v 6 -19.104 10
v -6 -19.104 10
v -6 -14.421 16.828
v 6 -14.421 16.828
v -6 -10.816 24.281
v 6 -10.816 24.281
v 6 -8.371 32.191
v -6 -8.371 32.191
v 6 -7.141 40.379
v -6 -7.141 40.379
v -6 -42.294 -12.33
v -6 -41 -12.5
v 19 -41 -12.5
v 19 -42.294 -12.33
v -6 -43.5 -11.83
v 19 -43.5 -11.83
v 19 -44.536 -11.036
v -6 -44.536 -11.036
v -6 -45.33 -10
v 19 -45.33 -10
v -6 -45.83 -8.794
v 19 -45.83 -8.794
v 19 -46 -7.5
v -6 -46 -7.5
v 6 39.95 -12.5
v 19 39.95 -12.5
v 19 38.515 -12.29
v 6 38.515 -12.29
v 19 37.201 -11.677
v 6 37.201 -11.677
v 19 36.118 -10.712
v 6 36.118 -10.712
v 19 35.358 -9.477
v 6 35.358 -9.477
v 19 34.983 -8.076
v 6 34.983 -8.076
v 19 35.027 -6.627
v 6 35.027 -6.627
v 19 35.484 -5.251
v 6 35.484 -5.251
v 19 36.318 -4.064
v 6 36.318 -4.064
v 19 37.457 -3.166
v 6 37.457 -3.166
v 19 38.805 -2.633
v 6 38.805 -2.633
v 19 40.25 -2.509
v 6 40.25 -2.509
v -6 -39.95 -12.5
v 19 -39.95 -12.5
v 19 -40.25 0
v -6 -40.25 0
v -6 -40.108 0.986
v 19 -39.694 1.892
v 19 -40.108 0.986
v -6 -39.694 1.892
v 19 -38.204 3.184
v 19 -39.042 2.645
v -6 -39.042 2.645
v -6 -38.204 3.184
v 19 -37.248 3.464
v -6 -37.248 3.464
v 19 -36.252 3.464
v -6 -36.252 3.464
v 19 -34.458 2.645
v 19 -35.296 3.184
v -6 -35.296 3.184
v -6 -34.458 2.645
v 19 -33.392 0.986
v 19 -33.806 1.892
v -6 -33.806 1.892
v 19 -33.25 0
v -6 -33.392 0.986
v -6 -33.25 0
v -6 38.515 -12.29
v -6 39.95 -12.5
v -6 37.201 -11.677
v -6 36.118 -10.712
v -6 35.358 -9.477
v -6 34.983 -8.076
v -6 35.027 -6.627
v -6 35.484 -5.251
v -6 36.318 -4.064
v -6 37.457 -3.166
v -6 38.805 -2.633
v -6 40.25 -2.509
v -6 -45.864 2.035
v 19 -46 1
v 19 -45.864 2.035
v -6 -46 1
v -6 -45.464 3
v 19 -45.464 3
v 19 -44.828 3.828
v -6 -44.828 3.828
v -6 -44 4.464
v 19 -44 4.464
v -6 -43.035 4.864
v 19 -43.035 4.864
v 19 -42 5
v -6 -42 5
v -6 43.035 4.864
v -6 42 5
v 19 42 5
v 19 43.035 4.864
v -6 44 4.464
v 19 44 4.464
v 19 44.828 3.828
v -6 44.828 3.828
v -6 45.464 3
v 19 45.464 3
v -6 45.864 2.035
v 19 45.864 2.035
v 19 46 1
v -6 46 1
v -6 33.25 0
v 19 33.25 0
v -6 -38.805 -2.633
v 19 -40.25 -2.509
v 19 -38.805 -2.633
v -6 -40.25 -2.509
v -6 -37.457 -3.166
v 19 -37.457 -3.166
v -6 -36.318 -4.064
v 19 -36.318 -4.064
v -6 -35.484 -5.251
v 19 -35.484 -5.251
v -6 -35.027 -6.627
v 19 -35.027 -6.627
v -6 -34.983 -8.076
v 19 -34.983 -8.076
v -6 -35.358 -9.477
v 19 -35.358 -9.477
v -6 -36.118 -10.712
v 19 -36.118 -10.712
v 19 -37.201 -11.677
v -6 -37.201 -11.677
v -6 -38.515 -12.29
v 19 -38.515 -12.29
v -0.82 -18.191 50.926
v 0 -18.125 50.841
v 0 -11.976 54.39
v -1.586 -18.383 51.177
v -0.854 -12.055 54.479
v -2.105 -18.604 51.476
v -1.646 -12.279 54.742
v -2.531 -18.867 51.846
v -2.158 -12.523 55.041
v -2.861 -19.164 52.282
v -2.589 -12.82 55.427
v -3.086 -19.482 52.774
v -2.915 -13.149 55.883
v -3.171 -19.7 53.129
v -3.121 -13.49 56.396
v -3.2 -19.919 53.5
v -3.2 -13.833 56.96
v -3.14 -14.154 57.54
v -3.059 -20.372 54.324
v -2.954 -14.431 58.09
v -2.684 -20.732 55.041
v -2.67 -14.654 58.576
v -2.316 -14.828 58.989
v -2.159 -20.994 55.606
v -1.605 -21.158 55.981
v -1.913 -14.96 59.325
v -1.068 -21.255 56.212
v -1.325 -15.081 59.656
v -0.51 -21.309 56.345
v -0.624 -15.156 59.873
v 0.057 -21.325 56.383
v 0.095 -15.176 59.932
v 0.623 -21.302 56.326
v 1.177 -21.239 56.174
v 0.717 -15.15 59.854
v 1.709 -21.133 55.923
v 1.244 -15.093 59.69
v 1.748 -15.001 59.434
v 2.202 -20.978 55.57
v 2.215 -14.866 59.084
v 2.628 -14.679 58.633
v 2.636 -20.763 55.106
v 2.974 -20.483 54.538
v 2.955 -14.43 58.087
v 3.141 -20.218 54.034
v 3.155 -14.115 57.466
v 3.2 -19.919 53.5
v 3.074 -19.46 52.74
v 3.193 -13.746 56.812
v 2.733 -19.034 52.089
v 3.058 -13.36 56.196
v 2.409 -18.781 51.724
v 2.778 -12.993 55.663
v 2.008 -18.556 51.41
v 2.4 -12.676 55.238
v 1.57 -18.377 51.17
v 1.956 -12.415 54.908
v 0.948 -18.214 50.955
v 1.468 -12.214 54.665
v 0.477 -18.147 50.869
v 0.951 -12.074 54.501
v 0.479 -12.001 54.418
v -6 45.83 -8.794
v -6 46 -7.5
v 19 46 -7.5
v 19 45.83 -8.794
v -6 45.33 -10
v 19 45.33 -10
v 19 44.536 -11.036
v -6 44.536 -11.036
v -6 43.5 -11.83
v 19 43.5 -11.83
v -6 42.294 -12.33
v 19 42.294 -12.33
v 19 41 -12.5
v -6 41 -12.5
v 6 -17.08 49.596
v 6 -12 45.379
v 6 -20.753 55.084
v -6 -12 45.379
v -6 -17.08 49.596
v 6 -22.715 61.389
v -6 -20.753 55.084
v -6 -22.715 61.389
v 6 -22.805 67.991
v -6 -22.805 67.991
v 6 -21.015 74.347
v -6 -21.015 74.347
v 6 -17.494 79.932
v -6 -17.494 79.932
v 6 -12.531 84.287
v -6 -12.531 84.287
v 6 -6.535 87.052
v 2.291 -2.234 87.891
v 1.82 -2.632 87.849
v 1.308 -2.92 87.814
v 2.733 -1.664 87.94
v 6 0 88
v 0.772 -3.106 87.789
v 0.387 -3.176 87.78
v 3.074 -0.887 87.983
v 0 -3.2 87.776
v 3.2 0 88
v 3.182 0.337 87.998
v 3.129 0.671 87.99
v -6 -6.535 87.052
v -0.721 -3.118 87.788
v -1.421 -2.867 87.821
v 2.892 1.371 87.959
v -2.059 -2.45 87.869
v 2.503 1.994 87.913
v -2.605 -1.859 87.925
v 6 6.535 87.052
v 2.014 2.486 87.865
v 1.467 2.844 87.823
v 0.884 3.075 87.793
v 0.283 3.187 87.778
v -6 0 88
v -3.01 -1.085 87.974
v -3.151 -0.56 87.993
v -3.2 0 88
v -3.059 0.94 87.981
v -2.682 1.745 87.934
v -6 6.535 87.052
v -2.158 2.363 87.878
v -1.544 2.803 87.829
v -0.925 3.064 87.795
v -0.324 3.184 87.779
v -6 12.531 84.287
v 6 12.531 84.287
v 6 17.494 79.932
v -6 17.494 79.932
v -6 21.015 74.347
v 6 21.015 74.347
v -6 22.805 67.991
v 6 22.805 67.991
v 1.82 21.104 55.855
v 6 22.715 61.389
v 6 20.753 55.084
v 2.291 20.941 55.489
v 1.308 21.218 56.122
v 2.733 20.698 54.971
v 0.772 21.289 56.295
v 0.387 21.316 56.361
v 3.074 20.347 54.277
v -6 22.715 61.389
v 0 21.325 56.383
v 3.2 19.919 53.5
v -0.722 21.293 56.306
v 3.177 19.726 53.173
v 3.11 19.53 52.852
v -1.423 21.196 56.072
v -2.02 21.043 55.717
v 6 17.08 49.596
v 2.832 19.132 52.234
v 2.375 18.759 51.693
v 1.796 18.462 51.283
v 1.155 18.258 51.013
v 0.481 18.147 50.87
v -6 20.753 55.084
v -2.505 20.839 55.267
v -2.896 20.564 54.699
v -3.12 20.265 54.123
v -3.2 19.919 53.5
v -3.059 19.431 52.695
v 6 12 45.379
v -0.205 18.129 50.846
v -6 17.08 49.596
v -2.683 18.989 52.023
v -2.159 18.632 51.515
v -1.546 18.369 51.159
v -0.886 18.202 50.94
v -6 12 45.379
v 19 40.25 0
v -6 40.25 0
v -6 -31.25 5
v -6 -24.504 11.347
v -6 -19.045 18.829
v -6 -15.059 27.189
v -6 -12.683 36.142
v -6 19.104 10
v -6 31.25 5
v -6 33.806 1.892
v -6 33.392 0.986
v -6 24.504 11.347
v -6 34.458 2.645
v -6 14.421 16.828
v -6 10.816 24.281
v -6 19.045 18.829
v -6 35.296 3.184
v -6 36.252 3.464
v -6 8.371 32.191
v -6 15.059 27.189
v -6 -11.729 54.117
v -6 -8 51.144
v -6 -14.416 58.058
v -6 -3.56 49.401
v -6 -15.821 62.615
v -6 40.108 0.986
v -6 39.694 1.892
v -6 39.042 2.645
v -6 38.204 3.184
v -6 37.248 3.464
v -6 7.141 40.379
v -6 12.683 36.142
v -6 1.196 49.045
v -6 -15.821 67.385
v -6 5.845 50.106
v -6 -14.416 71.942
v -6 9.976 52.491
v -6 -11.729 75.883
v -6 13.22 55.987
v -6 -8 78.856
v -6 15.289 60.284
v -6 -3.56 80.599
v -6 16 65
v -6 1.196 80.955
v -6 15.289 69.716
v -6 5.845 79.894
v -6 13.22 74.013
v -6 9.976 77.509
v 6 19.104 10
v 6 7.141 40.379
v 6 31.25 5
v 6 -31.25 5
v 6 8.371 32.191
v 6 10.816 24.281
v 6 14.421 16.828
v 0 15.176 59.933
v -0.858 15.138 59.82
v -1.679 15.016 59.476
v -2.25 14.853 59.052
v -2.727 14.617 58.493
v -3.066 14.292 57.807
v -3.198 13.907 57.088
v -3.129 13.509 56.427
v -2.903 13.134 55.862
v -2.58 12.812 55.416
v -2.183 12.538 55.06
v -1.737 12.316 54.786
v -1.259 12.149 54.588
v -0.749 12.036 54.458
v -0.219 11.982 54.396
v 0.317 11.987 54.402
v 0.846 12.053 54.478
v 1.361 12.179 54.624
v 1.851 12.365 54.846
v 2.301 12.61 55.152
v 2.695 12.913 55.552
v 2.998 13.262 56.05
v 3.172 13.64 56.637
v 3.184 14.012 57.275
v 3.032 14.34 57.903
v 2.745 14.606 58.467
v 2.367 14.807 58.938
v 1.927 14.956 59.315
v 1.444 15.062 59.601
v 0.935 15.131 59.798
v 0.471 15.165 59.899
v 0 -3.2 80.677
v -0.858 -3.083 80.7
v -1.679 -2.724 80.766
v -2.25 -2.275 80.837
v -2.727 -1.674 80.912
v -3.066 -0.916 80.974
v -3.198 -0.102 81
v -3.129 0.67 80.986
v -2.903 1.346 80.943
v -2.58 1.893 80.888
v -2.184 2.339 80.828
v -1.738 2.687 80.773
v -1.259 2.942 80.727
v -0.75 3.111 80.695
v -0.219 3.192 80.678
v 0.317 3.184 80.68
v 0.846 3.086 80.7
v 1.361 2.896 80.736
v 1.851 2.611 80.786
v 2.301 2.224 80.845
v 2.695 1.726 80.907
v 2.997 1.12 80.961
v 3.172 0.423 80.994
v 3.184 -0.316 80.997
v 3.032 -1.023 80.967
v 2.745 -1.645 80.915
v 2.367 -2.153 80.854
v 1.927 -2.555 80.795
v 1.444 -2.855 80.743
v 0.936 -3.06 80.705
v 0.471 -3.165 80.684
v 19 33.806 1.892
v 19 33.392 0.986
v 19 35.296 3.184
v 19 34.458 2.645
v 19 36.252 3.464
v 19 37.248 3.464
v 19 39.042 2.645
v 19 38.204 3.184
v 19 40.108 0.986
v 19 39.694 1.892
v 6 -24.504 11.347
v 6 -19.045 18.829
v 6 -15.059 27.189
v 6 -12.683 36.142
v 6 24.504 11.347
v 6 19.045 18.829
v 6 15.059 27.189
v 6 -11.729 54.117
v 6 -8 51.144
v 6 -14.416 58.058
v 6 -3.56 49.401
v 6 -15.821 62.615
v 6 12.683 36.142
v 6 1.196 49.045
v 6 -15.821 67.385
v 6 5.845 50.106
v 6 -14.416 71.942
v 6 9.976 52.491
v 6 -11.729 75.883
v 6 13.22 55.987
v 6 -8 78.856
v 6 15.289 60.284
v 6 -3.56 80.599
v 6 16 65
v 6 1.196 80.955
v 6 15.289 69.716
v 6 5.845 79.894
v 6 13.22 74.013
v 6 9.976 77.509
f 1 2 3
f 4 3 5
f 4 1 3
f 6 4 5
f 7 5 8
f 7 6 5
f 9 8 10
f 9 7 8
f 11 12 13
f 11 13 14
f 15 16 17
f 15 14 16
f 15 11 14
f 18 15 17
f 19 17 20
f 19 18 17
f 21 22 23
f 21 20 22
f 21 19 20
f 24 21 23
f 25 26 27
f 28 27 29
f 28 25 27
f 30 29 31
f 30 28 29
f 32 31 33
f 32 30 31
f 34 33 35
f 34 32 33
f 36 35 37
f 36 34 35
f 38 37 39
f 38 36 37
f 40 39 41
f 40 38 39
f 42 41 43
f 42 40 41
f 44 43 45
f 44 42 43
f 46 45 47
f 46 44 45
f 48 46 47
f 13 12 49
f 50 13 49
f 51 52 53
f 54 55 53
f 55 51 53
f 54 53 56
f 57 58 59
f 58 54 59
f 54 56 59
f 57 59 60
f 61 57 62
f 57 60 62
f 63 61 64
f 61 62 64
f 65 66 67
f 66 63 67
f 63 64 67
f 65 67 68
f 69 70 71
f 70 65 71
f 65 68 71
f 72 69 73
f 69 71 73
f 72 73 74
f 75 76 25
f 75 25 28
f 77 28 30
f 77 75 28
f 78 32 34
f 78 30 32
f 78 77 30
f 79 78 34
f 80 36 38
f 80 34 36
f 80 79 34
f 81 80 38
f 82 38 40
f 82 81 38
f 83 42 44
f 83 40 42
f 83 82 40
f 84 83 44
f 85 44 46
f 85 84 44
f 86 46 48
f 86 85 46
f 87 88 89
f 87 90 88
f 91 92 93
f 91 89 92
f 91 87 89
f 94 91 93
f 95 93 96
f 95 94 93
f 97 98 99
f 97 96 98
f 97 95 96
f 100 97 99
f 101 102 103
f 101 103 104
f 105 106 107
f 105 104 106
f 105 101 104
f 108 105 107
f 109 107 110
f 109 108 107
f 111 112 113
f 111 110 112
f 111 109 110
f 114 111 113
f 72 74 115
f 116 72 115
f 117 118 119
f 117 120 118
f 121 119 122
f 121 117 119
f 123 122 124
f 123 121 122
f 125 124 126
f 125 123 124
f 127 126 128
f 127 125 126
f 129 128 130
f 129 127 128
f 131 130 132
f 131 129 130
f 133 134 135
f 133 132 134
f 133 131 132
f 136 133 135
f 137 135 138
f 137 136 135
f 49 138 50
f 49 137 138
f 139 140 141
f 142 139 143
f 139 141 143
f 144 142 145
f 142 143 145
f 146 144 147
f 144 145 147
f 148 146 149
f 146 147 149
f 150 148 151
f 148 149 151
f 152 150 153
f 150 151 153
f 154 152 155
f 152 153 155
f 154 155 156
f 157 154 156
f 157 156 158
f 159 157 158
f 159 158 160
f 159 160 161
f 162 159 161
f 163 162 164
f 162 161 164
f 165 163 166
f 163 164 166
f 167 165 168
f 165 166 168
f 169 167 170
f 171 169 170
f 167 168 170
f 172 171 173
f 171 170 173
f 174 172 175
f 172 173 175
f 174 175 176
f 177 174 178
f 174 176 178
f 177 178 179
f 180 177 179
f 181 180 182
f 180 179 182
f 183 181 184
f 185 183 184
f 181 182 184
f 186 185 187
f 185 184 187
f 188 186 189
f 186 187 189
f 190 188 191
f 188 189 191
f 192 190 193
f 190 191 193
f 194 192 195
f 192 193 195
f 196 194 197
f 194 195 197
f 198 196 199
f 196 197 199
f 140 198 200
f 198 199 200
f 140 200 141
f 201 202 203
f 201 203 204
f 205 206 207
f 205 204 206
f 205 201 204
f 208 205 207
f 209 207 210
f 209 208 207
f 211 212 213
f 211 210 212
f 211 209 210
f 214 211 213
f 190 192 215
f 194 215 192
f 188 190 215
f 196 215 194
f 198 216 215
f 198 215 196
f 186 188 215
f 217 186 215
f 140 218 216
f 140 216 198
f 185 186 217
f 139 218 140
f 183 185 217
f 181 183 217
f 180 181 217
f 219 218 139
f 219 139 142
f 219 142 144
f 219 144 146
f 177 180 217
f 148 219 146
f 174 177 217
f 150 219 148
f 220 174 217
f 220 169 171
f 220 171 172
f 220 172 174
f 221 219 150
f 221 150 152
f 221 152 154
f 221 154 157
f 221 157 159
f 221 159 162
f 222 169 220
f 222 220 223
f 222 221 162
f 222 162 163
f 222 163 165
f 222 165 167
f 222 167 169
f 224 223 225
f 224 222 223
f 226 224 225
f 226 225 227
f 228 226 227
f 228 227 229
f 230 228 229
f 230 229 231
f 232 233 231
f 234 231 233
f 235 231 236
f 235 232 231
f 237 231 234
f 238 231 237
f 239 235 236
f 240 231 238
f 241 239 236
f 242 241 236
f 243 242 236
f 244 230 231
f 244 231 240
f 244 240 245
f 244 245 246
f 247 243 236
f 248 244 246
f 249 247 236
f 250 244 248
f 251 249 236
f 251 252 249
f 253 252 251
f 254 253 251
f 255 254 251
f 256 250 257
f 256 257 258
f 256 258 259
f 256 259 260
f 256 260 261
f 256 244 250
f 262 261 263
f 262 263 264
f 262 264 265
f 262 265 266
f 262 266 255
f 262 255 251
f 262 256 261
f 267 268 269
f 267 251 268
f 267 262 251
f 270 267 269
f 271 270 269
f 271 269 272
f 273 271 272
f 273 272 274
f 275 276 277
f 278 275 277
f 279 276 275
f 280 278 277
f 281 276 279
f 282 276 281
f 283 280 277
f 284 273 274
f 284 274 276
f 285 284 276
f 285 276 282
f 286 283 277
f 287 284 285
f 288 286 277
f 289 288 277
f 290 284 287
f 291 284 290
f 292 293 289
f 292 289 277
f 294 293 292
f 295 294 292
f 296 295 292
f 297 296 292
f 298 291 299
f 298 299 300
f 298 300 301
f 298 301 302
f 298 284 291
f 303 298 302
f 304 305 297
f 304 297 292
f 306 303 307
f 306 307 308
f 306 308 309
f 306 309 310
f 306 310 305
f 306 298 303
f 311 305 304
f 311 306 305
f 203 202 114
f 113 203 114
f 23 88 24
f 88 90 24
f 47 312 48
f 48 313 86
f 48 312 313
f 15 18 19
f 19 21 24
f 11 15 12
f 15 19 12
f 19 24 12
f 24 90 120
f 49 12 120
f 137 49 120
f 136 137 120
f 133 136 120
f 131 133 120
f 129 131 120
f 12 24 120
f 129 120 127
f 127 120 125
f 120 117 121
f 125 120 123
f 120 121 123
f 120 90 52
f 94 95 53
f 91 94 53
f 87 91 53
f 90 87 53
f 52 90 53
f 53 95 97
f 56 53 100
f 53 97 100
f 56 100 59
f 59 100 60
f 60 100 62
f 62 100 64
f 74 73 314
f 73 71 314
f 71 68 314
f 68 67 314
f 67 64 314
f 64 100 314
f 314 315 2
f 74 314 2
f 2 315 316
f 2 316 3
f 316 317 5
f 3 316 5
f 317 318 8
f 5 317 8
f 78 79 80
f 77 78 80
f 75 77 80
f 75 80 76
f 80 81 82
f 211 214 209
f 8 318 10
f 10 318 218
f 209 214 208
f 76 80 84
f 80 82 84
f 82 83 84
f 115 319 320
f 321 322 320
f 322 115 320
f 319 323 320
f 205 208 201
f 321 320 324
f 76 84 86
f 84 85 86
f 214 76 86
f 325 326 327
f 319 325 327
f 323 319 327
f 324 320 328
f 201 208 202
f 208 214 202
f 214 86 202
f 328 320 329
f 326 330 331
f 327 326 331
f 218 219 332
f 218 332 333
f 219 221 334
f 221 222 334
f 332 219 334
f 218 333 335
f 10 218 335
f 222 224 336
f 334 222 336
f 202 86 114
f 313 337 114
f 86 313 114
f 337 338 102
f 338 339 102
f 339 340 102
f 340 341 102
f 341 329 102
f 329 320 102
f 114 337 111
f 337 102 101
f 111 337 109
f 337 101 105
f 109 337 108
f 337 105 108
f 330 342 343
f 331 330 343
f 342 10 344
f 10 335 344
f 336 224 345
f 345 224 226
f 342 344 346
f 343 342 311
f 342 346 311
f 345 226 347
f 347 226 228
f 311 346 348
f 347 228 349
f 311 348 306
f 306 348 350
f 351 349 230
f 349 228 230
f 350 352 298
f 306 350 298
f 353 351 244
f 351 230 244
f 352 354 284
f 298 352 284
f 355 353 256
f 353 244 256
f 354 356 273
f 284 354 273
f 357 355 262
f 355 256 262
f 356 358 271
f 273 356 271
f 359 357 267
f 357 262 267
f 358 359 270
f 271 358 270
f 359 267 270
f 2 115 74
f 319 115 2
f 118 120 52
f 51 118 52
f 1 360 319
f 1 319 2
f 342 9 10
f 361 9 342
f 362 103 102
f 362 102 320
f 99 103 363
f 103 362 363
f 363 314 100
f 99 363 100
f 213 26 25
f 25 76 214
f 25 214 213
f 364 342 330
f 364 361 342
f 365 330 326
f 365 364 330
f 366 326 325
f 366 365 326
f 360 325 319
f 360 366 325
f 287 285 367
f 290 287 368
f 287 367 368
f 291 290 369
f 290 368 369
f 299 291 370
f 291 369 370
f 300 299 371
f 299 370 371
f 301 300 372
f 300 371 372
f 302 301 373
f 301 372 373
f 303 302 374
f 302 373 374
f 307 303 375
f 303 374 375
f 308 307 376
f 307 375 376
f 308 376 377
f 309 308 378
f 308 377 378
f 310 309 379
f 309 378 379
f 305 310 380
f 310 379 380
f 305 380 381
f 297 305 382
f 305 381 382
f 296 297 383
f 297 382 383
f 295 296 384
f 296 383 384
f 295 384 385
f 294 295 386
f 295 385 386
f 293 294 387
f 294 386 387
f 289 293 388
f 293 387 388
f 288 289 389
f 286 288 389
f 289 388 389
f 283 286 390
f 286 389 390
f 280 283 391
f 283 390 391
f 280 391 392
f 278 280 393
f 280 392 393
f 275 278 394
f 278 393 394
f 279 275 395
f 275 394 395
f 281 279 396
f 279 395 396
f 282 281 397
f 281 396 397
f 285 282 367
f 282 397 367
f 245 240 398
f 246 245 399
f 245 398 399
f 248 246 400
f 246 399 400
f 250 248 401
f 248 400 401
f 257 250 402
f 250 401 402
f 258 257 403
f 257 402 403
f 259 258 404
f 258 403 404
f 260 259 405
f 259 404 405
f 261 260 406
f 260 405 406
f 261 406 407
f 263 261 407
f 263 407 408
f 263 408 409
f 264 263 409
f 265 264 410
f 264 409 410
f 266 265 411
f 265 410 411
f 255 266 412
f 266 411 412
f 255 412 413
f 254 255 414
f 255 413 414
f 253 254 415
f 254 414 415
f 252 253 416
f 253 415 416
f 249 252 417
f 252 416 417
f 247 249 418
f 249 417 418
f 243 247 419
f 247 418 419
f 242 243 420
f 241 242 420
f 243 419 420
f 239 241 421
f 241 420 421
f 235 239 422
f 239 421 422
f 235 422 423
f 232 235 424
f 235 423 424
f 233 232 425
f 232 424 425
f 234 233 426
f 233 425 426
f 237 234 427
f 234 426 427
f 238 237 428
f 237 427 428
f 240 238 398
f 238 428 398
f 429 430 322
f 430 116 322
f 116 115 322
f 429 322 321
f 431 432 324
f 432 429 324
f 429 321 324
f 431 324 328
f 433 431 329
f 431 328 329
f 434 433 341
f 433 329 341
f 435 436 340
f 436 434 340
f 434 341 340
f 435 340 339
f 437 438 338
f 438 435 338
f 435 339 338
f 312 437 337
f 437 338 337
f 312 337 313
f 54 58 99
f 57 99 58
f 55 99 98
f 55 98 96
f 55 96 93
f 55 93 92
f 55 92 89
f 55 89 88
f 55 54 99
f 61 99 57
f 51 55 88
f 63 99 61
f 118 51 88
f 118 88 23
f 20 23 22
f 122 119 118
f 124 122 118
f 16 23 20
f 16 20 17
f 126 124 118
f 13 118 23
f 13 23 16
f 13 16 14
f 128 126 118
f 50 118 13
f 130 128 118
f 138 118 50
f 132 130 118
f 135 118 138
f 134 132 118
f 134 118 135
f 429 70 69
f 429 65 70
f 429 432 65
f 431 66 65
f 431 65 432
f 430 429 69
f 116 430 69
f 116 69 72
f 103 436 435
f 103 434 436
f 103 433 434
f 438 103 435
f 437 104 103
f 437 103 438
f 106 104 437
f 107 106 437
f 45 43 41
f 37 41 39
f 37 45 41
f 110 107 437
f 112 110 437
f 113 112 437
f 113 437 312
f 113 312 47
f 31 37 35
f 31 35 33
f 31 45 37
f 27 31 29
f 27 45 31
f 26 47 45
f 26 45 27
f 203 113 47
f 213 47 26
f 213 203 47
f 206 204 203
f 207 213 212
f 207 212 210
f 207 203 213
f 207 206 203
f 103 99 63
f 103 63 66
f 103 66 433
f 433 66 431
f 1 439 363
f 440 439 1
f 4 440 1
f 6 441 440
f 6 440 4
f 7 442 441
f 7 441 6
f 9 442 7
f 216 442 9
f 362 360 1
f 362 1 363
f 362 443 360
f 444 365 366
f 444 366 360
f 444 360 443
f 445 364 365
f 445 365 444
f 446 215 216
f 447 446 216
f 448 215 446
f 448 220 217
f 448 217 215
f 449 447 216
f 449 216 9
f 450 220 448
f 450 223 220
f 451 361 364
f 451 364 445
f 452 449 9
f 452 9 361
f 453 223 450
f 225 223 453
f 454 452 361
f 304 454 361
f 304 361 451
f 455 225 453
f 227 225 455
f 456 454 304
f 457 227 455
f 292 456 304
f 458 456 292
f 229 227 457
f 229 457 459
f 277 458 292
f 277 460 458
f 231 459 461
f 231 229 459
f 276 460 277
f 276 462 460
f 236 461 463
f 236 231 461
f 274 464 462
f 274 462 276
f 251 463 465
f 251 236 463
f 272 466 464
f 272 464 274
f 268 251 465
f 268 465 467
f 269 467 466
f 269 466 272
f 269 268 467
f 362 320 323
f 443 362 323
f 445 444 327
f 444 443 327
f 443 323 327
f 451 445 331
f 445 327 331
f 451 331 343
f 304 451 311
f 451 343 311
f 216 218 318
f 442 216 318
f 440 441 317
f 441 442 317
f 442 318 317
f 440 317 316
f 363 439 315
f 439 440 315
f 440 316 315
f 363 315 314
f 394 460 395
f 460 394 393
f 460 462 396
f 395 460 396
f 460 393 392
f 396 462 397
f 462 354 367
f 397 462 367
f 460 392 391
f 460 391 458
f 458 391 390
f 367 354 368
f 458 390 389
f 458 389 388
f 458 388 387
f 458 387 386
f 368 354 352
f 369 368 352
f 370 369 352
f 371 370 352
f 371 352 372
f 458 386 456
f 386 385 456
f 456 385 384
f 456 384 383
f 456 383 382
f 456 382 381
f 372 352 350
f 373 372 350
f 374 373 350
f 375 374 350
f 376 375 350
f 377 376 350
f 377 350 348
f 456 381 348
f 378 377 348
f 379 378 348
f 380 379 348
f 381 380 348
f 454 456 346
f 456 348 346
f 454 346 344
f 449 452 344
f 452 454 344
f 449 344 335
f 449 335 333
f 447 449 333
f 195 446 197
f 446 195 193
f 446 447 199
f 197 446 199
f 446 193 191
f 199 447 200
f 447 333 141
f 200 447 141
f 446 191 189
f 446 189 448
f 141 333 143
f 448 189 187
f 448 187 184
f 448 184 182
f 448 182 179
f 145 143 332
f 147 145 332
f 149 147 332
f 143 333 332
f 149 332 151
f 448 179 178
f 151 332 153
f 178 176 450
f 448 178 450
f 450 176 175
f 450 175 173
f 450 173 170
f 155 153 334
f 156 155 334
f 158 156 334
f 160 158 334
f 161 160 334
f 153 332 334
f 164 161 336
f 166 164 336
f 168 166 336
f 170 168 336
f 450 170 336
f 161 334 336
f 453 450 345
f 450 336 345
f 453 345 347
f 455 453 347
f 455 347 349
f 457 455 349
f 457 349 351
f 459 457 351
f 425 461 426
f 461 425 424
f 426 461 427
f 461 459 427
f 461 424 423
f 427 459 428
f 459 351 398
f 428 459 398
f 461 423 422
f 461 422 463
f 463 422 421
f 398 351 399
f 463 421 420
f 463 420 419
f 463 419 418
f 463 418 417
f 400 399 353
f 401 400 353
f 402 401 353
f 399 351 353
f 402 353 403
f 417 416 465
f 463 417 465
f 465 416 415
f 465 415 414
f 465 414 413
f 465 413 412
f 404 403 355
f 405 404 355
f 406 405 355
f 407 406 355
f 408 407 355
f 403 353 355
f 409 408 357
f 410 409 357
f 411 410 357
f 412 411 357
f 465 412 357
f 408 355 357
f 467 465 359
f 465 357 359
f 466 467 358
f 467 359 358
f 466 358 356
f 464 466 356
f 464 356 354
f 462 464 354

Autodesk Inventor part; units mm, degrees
ref_plane "YZ Plane" through (0, 0, 0) normal (1, 0, 0) x (0, 1, 0)
ref_plane "XZ Plane" through (0, 0, 0) normal (0, 1, 0) x (-1, 0, 0)
sketch "Sketch1" plane through (0, 0, 0) normal (1, 0, 0) x (0, 1, 0)
  line L0 (-46, -7.5) -> (-46, 1)
  line L1 (-42, 5) -> (42, 5)
  line L2 (46, 1) -> (46, -7.5)
  line L3 (-41, -12.5) -> (-39.95, -12.5)
  line L4 (-40.25, -2.509) -> (-40.25, 0)
  line L5 (-40.25, 0) -> (40.25, 0)
  arc A0 (46, 1) -> (42, 5) centre (42, 1) ccw
  arc A1 (-42, 5) -> (-46, 1) centre (-42, 1) ccw
  arc A2 (40.25, 0) -> (33.25, 0) centre (36.75, 0) ccw
  arc A3 (-33.25, 0) -> (-40.25, 0) centre (-36.75, 0) ccw
  line L6 (40.25, 0) -> (40.25, -2.509)
  arc A4 (-39.95, -12.5) -> (-40.25, -2.509) centre (-39.95, -7.5) ccw
  arc A5 (-46, -7.5) -> (-41, -12.5) centre (-41, -7.5) ccw
  circle A6 centre (39.95, -7.5) radius 5
  line L7 (41, -12.5) -> (39.95, -12.5)
  arc A7 (41, -12.5) -> (46, -7.5) centre (41, -7.5) ccw
  circle A8 centre (0, 65) radius 16
  circle A9 centre (0, 65) radius 23
  arc A10 (-31.25, 5) -> (-12, 45.3786) centre (-61.9911, 44.4333) ccw
  arc A11 (12, 45.3786) -> (31.25, 5) centre (61.9911, 44.4333) ccw
  point P0 (0, 0)
  point P1 (-46, -12.5)
  point P2 (-46, 5)
  point P3 (46, 5)
  point P4 (46, -12.5)
  point P5 (0, 0)
  point P6 (-40.25, -1.2545)
  point P7 (40.25, -1.2545)
  point P8 (40.25, -2.509)
  point P9 (0, 5)
  dimension "d71" = 10
  dimension "d2" = 80.5
  dimension "d10" = 92
  dimension "d11" = 5
  dimension "d52" = 4
  dimension "d53" = 7
  dimension "d54" = 7
  dimension "d67" = 10
  dimension "d68" = 7.5
  dimension "d69" = 0.3
  dimension "d70" = 5
  dimension "d72" = 0.3
  dimension "d73" = 5
  dimension "d74" = 32
  dimension "d75" = 7
  dimension "d76" = 65
  dimension "d77" = 2
  dimension "d78" = 2
  dimension "d79" = 12
  dimension "d80" = 50
extrude "Extrusion1" add sketch "Sketch1" along normal mid plane 12 contours L0 A1 L1 A0 L2 A7 L7 A6 L6 A2 L5 A3 L4 A4 L3 A5 | A10 A9 A11 L1 | A9 | A6
sketch "Sketch7" plane through (6, 0, 0) normal (1, 0, 0) x (0, 0, -1)
  arc A0 (-45.3786, 12) -> (-5, 31.25) centre (-44.4333, 61.9911) ccw projected
  arc A1 (-5, -31.25) -> (-45.3786, -12) centre (-44.4333, -61.9911) ccw projected
  arc A2 (-45.3786, 12) -> (-45.3786, -12) centre (-65, 0) ccw projected
  line L0 (-45.3786, 12) -> (-45.3786, -12)
  arc A3 (-45.3786, 12) -> (-5, 31.25) centre (-44.4333, 61.9911) ccw projected
  line L1 (-5, 31.25) -> (-5, -31.25)
  line L2 (0, -33.25) -> (0, 33.25) projected
  arc A4 (-45.3786, 12) -> (-5, 31.25) centre (-44.4333, 61.9911) ccw
  arc A5 (-5, -31.25) -> (-45.3786, -12) centre (-44.4333, -61.9911) ccw projected
  arc A6 (-5, -31.25) -> (-45.3786, -12) centre (-44.4333, -61.9911) ccw
  arc A7 (-10, -19.1035) -> (-40.3786, -7.1407) centre (-44.4333, -61.9911) ccw
  line L3 (-40.3786, -7.1407) -> (-40.3786, 7.1407)
  arc A8 (-40.3786, 7.1407) -> (-10, 19.1035) centre (-44.4333, 61.9911) ccw
  line L4 (-10, 19.1035) -> (-10, -19.1035)
  point P0 (0, 0)
  dimension "d81" = 5
extrude "Extrusion4" cut sketch "Sketch7" against normal through all contours A7 L3 A8 L4
sketch "Sketch8" plane through (6, 0, 0) normal (1, 0, 0) x (0, 0, -1)
  line L0 (-40.3786, -7.1407) -> (-40.3786, 7.1407) projected
  arc A0 (-40.3786, 7.1407) -> (-10, 19.1035) centre (-44.4333, 61.9911) ccw projected
  line L1 (-10, 19.1035) -> (-10, -19.1035) projected
  arc A1 (-10, -19.1035) -> (-40.3786, -7.1407) centre (-44.4333, -61.9911) ccw projected
  arc A2 (0, -33.25) -> (0, -40.25) centre (0, -36.75) ccw projected
  line L2 (0, -33.25) -> (0, 33.25) projected
  arc A3 (0, 40.25) -> (0, 33.25) centre (0, 36.75) ccw projected
  line L3 (0, 40.25) -> (2.509, 40.25) projected
  arc A4 (2.509, 40.25) -> (12.5, 39.95) centre (7.5, 39.95) ccw projected
  line L4 (12.5, 39.95) -> (12.5, 41) projected
  arc A5 (12.5, 41) -> (7.5, 46) centre (7.5, 41) ccw projected
  line L5 (7.5, 46) -> (-1, 46) projected
  arc A6 (-1, 46) -> (-5, 42) centre (-1, 42) ccw projected
  line L6 (-5, 42) -> (-5, 31.25) projected
  arc A7 (-45.3786, 12) -> (-5, 31.25) centre (-44.4333, 61.9911) ccw projected
  arc A8 (-45.3786, 12) -> (-45.3786, -12) centre (-65, 0) ccw projected
  arc A9 (-5, -31.25) -> (-45.3786, -12) centre (-44.4333, -61.9911) ccw projected
  line L7 (-5, -31.25) -> (-5, -42) projected
  arc A10 (-5, -42) -> (-1, -46) centre (-1, -42) ccw projected
  line L8 (-1, -46) -> (7.5, -46) projected
  arc A11 (7.5, -46) -> (12.5, -41) centre (7.5, -41) ccw projected
  line L9 (12.5, -41) -> (12.5, -39.95) projected
  arc A12 (12.5, -39.95) -> (2.509, -40.25) centre (7.5, -39.95) ccw projected
  line L10 (2.509, -40.25) -> (0, -40.25) projected
  circle A13 centre (-65, 0) radius 16 projected
  line L11 (-5, 31.25) -> (-5, -31.25)
  point P0 (0, 0)
extrude "Extrusion5" add sketch "Sketch8" along normal blind 13 contours A2 L10 A12 L9 A11 L8 A10 L7 L11 L6 A6 L5 A5 L4 A4 L3 A3 L2
ref_plane "Work Plane1" through (0, 0, 88) normal (0, 0, 1) x (1, 0, 0)
sketch "Sketch9" plane through (0, 0, 88) normal (0, 0, 1) x (1, 0, 0)
  point P0 (0, 0)
  point P1 (0, 0)
hole "Hole4" at (0, 0, 88) direction (0, 0, -1) diameter 6.4 depth 10
pattern_circular "Circular Pattern1" count 3 over 360 about axis through (0, 0, 65) along (1, 0, 0) of "Hole4"
equation "\"d72\" = d69"
properties part number "Rail-HeNeHolder" material "ABS Plastic"
